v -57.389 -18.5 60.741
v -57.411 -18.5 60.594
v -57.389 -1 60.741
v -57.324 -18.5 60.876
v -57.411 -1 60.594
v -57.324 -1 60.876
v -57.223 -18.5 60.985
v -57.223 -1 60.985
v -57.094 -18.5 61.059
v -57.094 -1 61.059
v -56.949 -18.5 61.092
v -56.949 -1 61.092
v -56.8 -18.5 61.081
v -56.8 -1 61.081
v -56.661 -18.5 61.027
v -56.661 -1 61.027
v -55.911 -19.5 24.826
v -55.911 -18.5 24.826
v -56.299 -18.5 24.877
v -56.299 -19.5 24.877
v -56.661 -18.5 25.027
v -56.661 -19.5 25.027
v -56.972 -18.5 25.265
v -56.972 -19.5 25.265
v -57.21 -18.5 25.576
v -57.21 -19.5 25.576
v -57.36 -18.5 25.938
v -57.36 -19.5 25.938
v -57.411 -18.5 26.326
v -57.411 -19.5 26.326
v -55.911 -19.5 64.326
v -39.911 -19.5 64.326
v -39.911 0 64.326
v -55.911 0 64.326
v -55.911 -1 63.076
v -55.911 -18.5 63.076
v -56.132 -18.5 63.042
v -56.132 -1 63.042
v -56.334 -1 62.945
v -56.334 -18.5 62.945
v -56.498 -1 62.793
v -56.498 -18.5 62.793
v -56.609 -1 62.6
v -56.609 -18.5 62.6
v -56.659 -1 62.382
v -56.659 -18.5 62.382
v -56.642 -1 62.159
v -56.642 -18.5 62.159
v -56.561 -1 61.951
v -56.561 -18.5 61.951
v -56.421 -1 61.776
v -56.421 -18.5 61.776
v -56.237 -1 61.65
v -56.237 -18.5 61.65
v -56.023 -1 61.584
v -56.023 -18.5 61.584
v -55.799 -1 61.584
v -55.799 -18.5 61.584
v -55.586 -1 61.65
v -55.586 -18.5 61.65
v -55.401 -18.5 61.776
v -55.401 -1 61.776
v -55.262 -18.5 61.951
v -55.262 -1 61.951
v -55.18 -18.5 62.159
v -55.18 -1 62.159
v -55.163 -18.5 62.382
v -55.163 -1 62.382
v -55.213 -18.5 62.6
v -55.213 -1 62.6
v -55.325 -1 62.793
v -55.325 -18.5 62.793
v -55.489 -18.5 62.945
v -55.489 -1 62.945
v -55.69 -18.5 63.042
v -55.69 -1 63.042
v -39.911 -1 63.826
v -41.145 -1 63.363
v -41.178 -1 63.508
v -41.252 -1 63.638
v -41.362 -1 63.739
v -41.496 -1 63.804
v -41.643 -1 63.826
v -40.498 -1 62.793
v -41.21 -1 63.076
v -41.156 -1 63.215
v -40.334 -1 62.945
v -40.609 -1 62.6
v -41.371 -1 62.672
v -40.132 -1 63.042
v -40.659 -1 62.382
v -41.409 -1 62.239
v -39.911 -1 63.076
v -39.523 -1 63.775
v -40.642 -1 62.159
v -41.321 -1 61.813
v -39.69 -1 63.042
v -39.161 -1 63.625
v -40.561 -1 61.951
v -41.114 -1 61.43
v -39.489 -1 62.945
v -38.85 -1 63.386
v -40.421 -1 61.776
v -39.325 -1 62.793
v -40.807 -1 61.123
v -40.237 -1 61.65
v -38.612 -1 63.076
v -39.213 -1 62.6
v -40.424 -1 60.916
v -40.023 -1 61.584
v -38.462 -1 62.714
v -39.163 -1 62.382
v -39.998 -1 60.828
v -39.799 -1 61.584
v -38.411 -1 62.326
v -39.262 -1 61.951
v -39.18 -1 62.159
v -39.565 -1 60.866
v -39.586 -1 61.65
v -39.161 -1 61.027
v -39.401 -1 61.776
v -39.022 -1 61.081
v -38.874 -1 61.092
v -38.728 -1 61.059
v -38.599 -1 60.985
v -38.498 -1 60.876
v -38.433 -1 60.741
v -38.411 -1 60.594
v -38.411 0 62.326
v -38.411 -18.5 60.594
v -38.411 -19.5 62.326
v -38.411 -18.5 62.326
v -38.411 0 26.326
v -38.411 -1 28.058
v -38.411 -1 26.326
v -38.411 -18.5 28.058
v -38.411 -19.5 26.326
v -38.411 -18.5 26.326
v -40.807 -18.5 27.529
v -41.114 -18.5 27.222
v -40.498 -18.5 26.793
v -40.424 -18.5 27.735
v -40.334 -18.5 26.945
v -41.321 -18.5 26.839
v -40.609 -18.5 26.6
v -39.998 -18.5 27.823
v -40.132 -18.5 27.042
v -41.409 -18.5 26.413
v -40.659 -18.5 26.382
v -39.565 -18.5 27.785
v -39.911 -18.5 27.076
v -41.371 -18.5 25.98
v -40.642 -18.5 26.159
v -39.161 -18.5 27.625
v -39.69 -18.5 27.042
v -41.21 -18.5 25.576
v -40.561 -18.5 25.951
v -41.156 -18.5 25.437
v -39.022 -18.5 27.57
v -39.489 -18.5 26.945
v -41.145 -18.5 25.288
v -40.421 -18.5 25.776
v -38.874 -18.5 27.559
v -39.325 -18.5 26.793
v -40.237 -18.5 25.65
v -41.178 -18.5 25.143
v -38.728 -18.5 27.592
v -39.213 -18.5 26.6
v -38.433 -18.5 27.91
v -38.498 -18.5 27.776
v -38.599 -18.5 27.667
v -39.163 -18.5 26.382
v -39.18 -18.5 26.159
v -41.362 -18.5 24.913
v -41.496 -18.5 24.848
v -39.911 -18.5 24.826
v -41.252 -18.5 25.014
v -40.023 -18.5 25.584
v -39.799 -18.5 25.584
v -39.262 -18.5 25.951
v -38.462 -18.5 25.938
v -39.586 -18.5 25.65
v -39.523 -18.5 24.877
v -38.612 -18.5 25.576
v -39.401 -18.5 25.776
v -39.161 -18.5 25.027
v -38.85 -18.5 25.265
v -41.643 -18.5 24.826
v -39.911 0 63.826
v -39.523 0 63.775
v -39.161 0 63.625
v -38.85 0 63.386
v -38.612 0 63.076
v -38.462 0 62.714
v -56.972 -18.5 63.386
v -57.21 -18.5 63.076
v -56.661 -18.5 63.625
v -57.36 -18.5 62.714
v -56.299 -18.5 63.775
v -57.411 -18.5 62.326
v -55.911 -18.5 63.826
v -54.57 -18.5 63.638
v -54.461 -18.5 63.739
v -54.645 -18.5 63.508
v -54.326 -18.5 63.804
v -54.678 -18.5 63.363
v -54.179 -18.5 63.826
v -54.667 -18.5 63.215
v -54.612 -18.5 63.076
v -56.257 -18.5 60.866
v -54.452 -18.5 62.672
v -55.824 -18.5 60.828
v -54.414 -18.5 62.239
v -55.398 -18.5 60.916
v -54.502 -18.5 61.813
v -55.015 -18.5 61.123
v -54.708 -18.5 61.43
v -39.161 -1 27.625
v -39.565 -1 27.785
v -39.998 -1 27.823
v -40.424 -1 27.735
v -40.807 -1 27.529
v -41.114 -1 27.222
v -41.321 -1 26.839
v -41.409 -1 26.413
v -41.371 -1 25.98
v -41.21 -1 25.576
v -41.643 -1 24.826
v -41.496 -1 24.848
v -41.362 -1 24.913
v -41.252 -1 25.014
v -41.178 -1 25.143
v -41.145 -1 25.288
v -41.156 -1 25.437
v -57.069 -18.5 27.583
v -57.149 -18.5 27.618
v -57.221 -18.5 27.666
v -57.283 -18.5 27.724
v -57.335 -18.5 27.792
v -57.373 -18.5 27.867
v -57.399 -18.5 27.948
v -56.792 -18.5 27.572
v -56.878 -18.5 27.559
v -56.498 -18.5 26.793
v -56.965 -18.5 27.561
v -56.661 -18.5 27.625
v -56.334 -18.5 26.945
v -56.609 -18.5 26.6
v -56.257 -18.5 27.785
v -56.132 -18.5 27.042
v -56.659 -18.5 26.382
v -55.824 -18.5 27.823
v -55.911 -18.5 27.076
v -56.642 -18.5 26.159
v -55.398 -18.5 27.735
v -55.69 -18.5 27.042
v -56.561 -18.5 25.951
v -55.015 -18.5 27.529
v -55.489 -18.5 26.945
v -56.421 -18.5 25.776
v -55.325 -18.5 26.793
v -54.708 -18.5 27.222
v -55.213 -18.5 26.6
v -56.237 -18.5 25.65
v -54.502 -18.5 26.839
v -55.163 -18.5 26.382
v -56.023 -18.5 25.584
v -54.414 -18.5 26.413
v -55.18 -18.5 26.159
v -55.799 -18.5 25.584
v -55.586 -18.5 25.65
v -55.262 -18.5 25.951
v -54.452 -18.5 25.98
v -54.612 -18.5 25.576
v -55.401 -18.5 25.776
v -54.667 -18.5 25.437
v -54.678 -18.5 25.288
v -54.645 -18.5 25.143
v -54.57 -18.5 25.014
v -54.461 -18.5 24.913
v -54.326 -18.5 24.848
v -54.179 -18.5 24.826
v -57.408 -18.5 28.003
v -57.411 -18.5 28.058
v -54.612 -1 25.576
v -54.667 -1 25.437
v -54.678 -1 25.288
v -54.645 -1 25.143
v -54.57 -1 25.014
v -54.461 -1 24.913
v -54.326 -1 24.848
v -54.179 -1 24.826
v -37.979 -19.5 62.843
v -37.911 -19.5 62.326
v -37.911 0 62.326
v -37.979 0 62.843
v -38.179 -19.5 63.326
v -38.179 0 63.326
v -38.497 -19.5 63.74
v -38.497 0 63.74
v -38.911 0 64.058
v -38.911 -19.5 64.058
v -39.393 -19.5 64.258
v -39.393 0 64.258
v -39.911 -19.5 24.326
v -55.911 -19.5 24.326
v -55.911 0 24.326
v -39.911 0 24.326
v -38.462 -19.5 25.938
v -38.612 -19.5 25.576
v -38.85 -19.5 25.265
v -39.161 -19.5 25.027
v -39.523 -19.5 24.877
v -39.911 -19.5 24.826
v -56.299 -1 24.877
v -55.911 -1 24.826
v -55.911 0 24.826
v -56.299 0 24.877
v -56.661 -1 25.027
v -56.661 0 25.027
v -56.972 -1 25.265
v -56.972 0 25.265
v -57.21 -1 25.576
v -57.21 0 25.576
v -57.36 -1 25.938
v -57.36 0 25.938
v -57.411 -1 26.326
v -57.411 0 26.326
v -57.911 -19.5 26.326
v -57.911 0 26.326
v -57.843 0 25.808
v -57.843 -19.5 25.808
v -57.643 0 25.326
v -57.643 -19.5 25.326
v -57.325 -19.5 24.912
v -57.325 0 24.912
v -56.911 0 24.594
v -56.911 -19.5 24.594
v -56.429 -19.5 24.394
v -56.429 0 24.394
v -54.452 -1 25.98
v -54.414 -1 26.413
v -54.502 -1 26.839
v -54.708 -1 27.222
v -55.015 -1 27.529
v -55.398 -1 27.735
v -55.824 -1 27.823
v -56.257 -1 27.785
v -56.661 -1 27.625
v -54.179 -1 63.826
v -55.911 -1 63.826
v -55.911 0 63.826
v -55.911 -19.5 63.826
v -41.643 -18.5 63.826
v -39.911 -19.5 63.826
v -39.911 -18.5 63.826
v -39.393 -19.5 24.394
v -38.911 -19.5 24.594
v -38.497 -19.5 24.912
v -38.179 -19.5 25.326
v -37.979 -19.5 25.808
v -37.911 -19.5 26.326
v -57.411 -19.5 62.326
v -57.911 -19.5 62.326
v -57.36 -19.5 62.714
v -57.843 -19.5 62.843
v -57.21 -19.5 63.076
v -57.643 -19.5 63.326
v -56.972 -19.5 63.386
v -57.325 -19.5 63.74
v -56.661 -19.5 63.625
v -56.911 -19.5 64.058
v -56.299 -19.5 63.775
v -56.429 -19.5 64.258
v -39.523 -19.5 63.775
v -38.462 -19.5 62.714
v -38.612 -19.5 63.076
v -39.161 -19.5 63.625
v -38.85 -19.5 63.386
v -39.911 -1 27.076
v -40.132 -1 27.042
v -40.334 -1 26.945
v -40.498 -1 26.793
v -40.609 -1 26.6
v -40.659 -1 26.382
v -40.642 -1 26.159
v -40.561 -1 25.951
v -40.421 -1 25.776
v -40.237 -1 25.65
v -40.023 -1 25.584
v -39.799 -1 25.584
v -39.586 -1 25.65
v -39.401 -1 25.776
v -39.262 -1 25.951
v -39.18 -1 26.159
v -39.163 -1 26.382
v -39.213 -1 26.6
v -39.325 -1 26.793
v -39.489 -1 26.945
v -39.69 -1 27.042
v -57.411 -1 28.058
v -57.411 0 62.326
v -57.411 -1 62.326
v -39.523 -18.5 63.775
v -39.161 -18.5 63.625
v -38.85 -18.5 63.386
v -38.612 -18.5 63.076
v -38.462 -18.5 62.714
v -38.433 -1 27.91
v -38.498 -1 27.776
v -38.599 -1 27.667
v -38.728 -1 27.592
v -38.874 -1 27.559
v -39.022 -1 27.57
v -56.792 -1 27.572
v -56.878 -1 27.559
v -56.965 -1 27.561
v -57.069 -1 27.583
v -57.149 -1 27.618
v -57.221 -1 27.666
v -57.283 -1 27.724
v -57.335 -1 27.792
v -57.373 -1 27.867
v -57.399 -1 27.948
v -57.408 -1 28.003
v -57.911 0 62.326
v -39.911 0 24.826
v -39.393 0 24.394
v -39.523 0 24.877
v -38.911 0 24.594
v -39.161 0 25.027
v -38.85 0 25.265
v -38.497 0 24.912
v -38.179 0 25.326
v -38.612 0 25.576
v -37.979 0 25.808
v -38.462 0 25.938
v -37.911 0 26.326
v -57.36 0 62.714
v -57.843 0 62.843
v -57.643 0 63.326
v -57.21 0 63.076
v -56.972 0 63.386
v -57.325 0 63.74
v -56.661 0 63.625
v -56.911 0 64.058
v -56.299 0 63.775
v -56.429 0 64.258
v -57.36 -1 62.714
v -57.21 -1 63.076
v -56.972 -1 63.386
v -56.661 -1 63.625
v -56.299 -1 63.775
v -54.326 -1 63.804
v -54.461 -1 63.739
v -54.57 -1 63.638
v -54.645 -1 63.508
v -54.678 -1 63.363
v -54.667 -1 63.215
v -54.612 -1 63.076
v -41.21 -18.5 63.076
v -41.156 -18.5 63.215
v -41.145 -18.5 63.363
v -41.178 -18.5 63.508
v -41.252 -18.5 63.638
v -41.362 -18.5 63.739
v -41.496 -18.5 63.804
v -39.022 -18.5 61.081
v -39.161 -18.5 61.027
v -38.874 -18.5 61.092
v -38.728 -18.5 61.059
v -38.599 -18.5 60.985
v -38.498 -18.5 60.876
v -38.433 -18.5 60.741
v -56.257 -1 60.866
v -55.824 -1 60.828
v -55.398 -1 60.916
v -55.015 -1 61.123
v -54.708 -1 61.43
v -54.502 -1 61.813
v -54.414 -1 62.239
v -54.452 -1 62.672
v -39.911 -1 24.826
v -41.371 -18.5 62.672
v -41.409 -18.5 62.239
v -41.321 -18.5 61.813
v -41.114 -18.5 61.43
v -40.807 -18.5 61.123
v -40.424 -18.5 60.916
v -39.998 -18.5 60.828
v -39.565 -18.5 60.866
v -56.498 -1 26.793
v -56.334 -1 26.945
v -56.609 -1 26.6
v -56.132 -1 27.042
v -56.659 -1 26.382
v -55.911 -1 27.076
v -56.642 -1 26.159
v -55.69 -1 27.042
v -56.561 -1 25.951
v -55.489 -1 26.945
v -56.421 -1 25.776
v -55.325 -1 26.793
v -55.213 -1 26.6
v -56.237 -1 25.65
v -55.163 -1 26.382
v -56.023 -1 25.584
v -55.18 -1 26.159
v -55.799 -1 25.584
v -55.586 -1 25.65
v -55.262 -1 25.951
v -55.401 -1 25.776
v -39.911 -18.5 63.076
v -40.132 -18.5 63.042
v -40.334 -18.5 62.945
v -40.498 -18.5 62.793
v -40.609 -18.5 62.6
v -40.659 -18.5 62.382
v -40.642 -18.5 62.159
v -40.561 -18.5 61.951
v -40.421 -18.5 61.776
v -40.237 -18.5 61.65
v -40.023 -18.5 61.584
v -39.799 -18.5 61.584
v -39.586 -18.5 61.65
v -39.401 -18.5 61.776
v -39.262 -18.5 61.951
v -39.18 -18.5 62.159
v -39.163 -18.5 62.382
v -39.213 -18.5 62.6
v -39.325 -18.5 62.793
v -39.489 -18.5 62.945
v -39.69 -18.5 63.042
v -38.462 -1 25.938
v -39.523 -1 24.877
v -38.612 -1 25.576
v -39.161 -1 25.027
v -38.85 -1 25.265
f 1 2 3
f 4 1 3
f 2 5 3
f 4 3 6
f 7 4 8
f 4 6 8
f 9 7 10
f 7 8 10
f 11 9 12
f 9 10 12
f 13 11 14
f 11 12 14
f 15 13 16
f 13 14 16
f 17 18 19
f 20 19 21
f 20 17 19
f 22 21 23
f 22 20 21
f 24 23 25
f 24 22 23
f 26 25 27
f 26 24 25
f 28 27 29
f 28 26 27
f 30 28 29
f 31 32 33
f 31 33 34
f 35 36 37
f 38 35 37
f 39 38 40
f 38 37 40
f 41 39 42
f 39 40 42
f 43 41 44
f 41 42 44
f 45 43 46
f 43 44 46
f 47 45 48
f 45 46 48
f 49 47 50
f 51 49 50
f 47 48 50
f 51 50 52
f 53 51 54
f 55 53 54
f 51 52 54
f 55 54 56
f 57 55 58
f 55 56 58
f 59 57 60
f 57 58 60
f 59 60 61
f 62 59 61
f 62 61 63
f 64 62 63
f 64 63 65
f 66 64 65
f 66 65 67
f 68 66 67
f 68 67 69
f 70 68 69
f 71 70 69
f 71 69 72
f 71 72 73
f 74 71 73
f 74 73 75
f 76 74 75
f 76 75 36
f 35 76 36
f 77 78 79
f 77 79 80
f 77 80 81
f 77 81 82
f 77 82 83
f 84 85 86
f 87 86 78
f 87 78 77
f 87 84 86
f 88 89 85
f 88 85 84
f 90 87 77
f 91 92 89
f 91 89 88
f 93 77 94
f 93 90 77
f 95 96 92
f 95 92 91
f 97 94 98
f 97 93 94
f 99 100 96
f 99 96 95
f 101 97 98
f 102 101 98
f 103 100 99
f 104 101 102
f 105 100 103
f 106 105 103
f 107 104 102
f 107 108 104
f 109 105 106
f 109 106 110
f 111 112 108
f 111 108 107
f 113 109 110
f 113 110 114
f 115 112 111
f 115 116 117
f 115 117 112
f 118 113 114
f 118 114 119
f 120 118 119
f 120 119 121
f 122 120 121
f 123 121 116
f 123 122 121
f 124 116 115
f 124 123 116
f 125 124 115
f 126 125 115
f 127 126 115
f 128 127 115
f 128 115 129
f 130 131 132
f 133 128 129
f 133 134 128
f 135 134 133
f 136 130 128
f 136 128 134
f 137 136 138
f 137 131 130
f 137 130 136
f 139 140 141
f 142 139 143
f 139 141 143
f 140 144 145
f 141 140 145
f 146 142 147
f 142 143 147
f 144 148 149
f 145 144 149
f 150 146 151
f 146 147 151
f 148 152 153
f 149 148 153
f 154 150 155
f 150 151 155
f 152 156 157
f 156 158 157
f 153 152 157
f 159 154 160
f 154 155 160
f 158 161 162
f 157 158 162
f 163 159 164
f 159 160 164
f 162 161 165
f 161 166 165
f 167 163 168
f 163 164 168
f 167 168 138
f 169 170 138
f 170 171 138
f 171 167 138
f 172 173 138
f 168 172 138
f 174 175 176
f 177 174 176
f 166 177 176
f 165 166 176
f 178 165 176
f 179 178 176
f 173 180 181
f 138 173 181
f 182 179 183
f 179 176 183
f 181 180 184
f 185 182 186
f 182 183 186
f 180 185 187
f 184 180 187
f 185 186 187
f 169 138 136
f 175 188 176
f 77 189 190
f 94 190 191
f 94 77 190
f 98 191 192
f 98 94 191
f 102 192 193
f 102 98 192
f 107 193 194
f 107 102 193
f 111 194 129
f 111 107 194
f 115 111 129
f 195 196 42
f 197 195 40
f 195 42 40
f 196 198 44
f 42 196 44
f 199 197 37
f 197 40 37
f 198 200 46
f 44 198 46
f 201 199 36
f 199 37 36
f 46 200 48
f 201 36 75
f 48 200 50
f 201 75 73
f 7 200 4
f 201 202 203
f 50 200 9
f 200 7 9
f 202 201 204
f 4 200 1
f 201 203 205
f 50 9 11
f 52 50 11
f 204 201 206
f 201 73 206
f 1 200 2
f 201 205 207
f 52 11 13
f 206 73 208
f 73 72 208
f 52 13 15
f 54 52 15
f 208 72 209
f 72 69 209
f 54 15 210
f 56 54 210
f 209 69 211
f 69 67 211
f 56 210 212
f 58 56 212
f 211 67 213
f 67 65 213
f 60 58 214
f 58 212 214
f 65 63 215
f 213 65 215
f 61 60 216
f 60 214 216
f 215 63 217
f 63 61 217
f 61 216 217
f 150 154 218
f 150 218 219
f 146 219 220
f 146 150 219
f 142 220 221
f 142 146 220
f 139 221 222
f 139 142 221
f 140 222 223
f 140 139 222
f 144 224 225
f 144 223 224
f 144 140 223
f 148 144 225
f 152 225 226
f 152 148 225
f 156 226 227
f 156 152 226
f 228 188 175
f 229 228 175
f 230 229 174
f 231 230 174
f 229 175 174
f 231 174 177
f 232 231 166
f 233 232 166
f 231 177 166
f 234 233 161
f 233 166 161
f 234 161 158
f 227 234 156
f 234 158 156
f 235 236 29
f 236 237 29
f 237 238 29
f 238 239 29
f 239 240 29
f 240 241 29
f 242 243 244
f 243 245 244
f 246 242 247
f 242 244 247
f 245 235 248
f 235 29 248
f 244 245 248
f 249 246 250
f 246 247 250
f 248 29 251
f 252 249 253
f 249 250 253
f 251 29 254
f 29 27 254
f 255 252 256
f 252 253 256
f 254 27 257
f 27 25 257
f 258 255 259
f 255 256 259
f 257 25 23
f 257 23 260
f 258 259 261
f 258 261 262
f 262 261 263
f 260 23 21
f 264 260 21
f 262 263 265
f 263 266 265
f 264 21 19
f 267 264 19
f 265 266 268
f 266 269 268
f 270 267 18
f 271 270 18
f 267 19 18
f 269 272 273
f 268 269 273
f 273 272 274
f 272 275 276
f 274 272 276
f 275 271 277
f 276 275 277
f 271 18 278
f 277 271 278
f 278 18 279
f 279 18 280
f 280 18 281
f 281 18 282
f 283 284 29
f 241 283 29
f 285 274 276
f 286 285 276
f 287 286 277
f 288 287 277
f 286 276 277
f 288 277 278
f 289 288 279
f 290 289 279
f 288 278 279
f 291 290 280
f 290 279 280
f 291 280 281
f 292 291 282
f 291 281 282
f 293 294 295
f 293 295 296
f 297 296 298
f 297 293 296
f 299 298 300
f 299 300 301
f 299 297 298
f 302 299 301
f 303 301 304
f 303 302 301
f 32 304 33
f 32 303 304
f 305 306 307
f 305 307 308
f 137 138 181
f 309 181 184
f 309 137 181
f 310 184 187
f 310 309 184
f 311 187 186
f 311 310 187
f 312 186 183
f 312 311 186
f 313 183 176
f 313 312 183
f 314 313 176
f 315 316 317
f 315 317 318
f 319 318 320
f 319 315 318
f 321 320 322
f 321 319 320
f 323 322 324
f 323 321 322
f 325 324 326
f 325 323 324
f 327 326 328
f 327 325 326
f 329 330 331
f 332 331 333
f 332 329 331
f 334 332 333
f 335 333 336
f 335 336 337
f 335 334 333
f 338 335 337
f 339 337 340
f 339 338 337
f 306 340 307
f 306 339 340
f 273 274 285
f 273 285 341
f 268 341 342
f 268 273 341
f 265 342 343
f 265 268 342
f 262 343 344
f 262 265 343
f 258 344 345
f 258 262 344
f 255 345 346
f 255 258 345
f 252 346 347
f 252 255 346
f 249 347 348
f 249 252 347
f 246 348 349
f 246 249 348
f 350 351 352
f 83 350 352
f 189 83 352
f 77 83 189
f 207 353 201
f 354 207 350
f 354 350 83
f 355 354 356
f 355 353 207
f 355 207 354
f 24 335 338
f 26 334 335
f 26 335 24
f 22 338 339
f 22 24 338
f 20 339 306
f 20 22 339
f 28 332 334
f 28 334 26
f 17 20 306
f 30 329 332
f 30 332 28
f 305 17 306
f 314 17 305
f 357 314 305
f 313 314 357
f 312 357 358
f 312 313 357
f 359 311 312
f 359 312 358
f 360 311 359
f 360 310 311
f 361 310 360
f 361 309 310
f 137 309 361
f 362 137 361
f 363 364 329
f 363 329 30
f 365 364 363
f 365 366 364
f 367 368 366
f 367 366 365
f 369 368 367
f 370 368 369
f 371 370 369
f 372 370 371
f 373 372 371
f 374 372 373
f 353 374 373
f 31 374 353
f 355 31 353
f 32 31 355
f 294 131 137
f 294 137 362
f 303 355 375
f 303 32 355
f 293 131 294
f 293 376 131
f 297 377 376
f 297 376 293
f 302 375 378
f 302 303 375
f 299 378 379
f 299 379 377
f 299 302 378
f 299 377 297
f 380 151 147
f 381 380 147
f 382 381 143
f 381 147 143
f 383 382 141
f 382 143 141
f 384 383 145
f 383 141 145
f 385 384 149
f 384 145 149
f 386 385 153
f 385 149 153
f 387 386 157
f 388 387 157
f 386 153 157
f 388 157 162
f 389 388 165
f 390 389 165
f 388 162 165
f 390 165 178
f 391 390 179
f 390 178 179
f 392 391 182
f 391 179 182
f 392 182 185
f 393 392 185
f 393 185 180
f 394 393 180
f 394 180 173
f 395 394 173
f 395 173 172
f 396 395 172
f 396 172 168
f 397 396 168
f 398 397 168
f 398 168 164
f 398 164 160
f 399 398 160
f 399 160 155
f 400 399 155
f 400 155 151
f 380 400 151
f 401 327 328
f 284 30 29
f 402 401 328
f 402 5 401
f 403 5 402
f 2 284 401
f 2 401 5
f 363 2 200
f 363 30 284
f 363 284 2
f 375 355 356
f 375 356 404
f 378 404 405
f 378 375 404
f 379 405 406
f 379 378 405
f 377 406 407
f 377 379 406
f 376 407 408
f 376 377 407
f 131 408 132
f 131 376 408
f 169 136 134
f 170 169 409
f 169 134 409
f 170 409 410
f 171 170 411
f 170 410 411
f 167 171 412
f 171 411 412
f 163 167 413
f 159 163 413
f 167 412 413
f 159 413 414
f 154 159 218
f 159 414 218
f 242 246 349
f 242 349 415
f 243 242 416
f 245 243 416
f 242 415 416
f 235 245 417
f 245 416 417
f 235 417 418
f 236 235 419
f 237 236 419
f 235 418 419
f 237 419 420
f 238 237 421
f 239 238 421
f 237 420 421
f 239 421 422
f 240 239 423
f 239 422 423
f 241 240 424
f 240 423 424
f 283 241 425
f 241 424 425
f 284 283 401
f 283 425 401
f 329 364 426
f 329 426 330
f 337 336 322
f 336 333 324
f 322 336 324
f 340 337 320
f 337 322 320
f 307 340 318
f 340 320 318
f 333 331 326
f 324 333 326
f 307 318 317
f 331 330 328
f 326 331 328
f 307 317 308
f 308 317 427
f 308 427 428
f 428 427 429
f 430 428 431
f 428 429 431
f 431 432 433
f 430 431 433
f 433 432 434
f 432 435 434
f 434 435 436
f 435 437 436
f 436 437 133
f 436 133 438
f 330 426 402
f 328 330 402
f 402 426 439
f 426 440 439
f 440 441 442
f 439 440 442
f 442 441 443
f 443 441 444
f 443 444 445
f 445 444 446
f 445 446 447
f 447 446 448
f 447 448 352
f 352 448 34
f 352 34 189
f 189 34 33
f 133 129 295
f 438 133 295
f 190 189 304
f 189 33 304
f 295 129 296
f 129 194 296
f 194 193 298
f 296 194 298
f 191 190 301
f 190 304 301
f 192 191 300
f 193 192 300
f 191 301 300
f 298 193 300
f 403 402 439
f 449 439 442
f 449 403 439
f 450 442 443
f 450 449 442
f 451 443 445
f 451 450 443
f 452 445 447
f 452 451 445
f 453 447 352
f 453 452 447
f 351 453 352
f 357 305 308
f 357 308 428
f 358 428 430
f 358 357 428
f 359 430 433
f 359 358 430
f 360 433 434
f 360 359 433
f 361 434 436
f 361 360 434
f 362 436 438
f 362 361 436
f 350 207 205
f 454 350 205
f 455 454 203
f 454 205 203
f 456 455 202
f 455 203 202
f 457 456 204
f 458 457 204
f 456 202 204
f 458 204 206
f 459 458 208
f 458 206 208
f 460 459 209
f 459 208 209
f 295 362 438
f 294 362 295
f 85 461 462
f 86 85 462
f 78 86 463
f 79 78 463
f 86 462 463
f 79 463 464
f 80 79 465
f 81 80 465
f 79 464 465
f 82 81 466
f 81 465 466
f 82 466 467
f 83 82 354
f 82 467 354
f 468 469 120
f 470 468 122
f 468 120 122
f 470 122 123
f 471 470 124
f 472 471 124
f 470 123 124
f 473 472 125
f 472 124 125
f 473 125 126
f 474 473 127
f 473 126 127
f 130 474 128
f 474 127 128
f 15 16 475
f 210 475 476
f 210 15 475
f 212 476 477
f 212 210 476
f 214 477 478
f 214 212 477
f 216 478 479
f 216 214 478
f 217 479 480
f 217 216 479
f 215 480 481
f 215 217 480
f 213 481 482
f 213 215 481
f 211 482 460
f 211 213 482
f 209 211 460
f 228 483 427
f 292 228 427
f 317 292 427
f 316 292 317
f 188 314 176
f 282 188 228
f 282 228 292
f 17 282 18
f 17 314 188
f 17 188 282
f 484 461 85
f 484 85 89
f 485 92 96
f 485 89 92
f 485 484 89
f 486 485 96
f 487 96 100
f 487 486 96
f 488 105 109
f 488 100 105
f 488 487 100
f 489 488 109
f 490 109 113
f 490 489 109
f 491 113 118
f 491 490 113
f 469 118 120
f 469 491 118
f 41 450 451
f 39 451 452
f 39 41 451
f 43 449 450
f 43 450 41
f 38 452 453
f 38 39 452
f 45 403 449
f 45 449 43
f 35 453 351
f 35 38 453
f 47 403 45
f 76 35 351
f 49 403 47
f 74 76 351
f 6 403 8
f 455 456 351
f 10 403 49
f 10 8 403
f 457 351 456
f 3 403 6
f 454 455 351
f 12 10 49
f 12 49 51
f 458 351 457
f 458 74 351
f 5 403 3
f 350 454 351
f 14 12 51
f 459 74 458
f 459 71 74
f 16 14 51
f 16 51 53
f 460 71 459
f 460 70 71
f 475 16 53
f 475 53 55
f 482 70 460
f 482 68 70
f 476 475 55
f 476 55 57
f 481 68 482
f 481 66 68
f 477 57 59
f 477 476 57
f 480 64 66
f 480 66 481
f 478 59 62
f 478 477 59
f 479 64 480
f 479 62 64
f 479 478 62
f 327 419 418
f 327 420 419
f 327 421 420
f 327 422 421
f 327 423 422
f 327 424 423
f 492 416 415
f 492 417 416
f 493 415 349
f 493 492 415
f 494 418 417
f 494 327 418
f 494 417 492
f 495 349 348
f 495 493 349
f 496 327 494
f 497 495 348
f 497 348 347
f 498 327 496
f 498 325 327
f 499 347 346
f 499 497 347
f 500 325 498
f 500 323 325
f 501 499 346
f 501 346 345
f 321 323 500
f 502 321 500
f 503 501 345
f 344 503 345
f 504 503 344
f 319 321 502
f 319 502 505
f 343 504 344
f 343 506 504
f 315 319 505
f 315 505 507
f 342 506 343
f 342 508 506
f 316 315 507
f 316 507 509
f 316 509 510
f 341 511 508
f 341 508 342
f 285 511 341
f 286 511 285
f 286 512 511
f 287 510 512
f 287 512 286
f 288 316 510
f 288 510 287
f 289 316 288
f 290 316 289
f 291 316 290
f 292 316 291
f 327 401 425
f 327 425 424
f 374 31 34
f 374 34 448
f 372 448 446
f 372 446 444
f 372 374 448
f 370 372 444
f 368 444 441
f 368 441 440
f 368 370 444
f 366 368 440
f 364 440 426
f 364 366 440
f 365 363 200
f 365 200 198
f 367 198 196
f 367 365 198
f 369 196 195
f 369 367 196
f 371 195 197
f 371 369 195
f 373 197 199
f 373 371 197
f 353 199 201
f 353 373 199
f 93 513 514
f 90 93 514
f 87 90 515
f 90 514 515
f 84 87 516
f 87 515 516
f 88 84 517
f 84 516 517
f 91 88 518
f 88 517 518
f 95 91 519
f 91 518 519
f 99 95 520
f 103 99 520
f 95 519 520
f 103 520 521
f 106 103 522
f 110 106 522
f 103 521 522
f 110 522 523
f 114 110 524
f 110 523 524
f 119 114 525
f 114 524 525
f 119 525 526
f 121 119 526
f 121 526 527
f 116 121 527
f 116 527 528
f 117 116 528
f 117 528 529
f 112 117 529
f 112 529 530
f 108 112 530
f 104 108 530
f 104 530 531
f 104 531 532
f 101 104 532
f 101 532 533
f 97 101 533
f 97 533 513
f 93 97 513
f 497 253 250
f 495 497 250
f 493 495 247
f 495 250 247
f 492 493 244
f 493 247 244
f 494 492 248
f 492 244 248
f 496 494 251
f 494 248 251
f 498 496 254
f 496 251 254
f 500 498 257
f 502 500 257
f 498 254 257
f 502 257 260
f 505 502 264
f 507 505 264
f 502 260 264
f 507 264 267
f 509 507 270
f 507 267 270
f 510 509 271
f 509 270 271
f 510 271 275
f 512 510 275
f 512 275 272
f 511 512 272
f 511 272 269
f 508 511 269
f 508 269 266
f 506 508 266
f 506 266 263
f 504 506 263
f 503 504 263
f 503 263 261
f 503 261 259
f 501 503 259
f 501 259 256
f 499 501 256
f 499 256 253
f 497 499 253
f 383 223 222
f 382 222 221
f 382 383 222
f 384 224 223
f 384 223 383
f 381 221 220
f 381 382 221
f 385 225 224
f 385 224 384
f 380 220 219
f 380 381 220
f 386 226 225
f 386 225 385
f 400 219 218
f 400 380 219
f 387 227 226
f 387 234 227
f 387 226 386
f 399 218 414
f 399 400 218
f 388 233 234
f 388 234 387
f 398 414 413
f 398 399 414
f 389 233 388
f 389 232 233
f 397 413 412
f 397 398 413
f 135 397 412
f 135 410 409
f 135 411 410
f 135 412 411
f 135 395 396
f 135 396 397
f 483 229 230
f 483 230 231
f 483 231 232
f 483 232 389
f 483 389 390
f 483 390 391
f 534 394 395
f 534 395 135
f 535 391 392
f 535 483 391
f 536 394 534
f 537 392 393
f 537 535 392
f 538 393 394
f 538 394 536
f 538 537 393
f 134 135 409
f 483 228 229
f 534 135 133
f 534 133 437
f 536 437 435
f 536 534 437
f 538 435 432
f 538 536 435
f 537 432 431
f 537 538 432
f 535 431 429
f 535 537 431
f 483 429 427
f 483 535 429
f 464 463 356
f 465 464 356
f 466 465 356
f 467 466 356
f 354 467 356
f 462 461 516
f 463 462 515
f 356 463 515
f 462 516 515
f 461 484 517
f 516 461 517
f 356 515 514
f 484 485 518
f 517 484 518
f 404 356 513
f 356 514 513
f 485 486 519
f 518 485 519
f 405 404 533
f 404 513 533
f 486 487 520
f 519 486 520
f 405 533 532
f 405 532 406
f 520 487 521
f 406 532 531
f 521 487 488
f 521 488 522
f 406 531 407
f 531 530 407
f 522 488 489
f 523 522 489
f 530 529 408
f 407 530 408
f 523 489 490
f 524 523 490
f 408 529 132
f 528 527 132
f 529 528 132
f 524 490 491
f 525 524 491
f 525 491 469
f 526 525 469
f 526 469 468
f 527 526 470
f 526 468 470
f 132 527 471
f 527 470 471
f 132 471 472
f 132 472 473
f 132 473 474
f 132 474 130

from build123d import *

# Parameters (mm, degrees)
ESQUISSE1_R             = 0.7500000000000007
BOSS_EXTRU_1_DEPTH      = 19.5
ENL_V_START             = -1
ESQUISSE2_R             = 1.5000000000042053
ESQUISSE2_R_2           = 1.5000000000000118
ESQUISSE2_R_3           = 1.5000000000000042
ESQUISSE2_R_4           = 1.4999999999999973
ENL_V_MAT_EXTRU_1_DEPTH = 1
ENL_V_START_2           = -19.5
ESQUISSE2_2_R           = 1.5000000000042053
ESQUISSE2_2_R_2         = 1.5000000000000118
ESQUISSE2_2_R_3         = 1.5000000000000042
ESQUISSE2_2_R_4         = 1.4999999999999973
ENL_V_MAT_EXTRU_2_DEPTH = 1
CONG_1_R                = 0.5
CONG_2_START            = -18.5
CONG_2_DEPTH            = 17.5


with BuildPart() as part:
    # Esquisse1 → Boss.-Extru.1 (new body)
    with BuildSketch(Plane.XZ.offset(19.5)):
        with BuildLine():
            Line((-55.9111281070707, 24.325812619498315), (-39.91112810707456, 24.325812619498663))
            ThreePointArc((-39.91112810707456, 24.325812619498663), (-38.49691454470147, 24.911599057125567), (-37.91112810707456, 26.325812619498663))
            Line((-37.91112810707456, 26.325812619498663), (-37.91112810707456, 62.32581261950286))
            ThreePointArc((-37.91112810707456, 62.32581261950286), (-38.49691454470147, 63.740026181875955), (-39.91112810707456, 64.32581261950286))
            Line((-39.91112810707456, 64.32581261950286), (-55.91112810707387, 64.32581261950355))
            ThreePointArc((-55.91112810707387, 64.32581261950355), (-57.3253416694479, 63.74002618187669), (-57.91112810707526, 62.32581261950286))
            Line((-57.91112810707526, 62.32581261950286), (-57.91112810707456, 26.325812619502862))
            ThreePointArc((-57.91112810707456, 26.325812619502862), (-57.325341669446544, 24.911599057126917), (-55.9111281070707, 24.325812619498315))
        make_face()
        with Locations(Location((-39.91112810707456, 26.325812619498663, 0), (0, 0, 90))):
            Circle(ESQUISSE1_R, mode=Mode.SUBTRACT)
        with Locations(Location((-39.91112810707456, 62.32581261950286, 0), (0, 0, 90))):
            Circle(ESQUISSE1_R, mode=Mode.SUBTRACT)
        with Locations(Location((-55.91112810707456, 62.32581261950286, 0), (0, 0, 90))):
            Circle(ESQUISSE1_R, mode=Mode.SUBTRACT)
        with Locations(Location((-55.911128107070354, 26.325812619502862, 0), (0, 0, 90))):
            Circle(ESQUISSE1_R, mode=Mode.SUBTRACT)
        with BuildLine():
            Line((-38.41112810707456, 62.32581261950286), (-38.41112810707455, 26.325812619498663))
            ThreePointArc((-38.41112810707455, 26.325812619498663), (-40.97178827885439, 27.38647279127849), (-39.91112810707456, 24.825812619498656))
            Line((-39.91112810707456, 24.825812619498656), (-55.911128107070354, 24.825812619498652))
            ThreePointArc((-55.911128107070354, 24.825812619498652), (-54.850467935287554, 27.386472791285662), (-57.41112810707456, 26.325812619502862))
            Line((-57.41112810707456, 26.325812619502862), (-57.41112810707456, 62.32581261950286))
            ThreePointArc((-57.41112810707456, 62.32581261950286), (-54.85046793529474, 61.26515244772304), (-55.91112810707456, 63.82581261950286))
            Line((-55.91112810707456, 63.82581261950286), (-39.91112810707456, 63.82581261950286))
            ThreePointArc((-39.91112810707456, 63.82581261950286), (-40.97178827885438, 61.26515244772304), (-38.41112810707456, 62.32581261950286))
        make_face(mode=Mode.SUBTRACT)
    extrude(amount=-BOSS_EXTRU_1_DEPTH)

    # Esquisse2 → Enlèv. mat.-Extru.1 (cut)
    with BuildSketch(Plane(origin=(0, 0, 0), x_dir=(1, 0, 0), z_dir=(0, 1, 0)).offset(ENL_V_START)):
        with Locations((-55.911128107070354, -26.325812619502862)):
            Circle(ESQUISSE2_R)
        with Locations((-39.91112810707456, -26.325812619498663)):
            Circle(ESQUISSE2_R_2)
        with Locations((-55.91112810707456, -62.32581261950286)):
            Circle(ESQUISSE2_R_3)
        with Locations((-39.91112810707456, -62.32581261950286)):
            Circle(ESQUISSE2_R_4)
    extrude(amount=ENL_V_MAT_EXTRU_1_DEPTH, mode=Mode.SUBTRACT)

    # Esquisse2<2> → Enlèv. mat.-Extru.2 (cut)
    with BuildSketch(Plane(origin=(0, 0, 0), x_dir=(1, 0, 0), z_dir=(0, 1, 0)).offset(ENL_V_START_2)):
        with Locations((-55.911128107070354, -26.325812619502862)):
            Circle(ESQUISSE2_2_R)
        with Locations((-39.91112810707456, -26.325812619498663)):
            Circle(ESQUISSE2_2_R_2)
        with Locations((-55.91112810707456, -62.32581261950286)):
            Circle(ESQUISSE2_2_R_3)
        with Locations((-39.91112810707456, -62.32581261950286)):
            Circle(ESQUISSE2_2_R_4)
    extrude(amount=ENL_V_MAT_EXTRU_2_DEPTH, mode=Mode.SUBTRACT)

    # Congé1
    cong_1_edges = [part.edges().sort_by_distance(p)[0] for p in [
        (-57.41112810707456, -9.75, 26.325812619502862),
        (-38.41112810707456, -9.75, 26.325812619498663),
        (-57.41112810707456, -9.75, 62.32581261950286),
        (-38.41112810707456, -9.75, 62.32581261950286),
    ]]
    fillet(cong_1_edges, radius=CONG_1_R - 0.0001)  # a hair under: the kernel refuses the full size

    # Congé2: read off the stored shape, not the designer's step
    # Congé2 outline → Congé2 (add)
    with BuildSketch(Plane(origin=(0, 0, 0), x_dir=(1, 0, 0), z_dir=(0, 1, 0)).offset(CONG_2_START)):
        with BuildLine():
            ThreePointArc((-39.911128107, -63.82581262), (-40.661128107, -63.624850726), (-41.210166213, -63.07581262))
            ThreePointArc((-41.210166213, -63.07581262), (-41.210166213, -63.57581262), (-41.643178915, -63.82581262))
            Line((-41.643178915, -63.82581262), (-39.911128107, -63.82581262))
        make_face()
        with BuildLine():
            Line((-55.911128107, -63.82581262), (-54.1790773, -63.82581262))
            ThreePointArc((-54.1790773, -63.82581262), (-54.612090001, -63.57581262), (-54.612090001, -63.07581262))
            ThreePointArc((-54.612090001, -63.07581262), (-55.161128107, -63.624850725), (-55.911128107, -63.82581262))
        make_face()
        with BuildLine():
            Line((-39.911128107, -24.825812619), (-41.643178915, -24.825812619))
            ThreePointArc((-41.643178915, -24.825812619), (-41.210166213, -25.075812619), (-41.210166213, -25.575812619))
            ThreePointArc((-41.210166213, -25.575812619), (-40.661128107, -25.026774513), (-39.911128107, -24.825812619))
        make_face()
        with BuildLine():
            ThreePointArc((-54.612090001, -25.575812619), (-54.612090001, -25.075812619), (-54.179077299, -24.825812619))
            Line((-54.179077299, -24.825812619), (-55.911128107, -24.825812619))
            ThreePointArc((-55.911128107, -24.825812619), (-55.161128107, -25.026774514), (-54.612090001, -25.575812619))
        make_face()
    extrude(amount=CONG_2_DEPTH)


solid = part.part
